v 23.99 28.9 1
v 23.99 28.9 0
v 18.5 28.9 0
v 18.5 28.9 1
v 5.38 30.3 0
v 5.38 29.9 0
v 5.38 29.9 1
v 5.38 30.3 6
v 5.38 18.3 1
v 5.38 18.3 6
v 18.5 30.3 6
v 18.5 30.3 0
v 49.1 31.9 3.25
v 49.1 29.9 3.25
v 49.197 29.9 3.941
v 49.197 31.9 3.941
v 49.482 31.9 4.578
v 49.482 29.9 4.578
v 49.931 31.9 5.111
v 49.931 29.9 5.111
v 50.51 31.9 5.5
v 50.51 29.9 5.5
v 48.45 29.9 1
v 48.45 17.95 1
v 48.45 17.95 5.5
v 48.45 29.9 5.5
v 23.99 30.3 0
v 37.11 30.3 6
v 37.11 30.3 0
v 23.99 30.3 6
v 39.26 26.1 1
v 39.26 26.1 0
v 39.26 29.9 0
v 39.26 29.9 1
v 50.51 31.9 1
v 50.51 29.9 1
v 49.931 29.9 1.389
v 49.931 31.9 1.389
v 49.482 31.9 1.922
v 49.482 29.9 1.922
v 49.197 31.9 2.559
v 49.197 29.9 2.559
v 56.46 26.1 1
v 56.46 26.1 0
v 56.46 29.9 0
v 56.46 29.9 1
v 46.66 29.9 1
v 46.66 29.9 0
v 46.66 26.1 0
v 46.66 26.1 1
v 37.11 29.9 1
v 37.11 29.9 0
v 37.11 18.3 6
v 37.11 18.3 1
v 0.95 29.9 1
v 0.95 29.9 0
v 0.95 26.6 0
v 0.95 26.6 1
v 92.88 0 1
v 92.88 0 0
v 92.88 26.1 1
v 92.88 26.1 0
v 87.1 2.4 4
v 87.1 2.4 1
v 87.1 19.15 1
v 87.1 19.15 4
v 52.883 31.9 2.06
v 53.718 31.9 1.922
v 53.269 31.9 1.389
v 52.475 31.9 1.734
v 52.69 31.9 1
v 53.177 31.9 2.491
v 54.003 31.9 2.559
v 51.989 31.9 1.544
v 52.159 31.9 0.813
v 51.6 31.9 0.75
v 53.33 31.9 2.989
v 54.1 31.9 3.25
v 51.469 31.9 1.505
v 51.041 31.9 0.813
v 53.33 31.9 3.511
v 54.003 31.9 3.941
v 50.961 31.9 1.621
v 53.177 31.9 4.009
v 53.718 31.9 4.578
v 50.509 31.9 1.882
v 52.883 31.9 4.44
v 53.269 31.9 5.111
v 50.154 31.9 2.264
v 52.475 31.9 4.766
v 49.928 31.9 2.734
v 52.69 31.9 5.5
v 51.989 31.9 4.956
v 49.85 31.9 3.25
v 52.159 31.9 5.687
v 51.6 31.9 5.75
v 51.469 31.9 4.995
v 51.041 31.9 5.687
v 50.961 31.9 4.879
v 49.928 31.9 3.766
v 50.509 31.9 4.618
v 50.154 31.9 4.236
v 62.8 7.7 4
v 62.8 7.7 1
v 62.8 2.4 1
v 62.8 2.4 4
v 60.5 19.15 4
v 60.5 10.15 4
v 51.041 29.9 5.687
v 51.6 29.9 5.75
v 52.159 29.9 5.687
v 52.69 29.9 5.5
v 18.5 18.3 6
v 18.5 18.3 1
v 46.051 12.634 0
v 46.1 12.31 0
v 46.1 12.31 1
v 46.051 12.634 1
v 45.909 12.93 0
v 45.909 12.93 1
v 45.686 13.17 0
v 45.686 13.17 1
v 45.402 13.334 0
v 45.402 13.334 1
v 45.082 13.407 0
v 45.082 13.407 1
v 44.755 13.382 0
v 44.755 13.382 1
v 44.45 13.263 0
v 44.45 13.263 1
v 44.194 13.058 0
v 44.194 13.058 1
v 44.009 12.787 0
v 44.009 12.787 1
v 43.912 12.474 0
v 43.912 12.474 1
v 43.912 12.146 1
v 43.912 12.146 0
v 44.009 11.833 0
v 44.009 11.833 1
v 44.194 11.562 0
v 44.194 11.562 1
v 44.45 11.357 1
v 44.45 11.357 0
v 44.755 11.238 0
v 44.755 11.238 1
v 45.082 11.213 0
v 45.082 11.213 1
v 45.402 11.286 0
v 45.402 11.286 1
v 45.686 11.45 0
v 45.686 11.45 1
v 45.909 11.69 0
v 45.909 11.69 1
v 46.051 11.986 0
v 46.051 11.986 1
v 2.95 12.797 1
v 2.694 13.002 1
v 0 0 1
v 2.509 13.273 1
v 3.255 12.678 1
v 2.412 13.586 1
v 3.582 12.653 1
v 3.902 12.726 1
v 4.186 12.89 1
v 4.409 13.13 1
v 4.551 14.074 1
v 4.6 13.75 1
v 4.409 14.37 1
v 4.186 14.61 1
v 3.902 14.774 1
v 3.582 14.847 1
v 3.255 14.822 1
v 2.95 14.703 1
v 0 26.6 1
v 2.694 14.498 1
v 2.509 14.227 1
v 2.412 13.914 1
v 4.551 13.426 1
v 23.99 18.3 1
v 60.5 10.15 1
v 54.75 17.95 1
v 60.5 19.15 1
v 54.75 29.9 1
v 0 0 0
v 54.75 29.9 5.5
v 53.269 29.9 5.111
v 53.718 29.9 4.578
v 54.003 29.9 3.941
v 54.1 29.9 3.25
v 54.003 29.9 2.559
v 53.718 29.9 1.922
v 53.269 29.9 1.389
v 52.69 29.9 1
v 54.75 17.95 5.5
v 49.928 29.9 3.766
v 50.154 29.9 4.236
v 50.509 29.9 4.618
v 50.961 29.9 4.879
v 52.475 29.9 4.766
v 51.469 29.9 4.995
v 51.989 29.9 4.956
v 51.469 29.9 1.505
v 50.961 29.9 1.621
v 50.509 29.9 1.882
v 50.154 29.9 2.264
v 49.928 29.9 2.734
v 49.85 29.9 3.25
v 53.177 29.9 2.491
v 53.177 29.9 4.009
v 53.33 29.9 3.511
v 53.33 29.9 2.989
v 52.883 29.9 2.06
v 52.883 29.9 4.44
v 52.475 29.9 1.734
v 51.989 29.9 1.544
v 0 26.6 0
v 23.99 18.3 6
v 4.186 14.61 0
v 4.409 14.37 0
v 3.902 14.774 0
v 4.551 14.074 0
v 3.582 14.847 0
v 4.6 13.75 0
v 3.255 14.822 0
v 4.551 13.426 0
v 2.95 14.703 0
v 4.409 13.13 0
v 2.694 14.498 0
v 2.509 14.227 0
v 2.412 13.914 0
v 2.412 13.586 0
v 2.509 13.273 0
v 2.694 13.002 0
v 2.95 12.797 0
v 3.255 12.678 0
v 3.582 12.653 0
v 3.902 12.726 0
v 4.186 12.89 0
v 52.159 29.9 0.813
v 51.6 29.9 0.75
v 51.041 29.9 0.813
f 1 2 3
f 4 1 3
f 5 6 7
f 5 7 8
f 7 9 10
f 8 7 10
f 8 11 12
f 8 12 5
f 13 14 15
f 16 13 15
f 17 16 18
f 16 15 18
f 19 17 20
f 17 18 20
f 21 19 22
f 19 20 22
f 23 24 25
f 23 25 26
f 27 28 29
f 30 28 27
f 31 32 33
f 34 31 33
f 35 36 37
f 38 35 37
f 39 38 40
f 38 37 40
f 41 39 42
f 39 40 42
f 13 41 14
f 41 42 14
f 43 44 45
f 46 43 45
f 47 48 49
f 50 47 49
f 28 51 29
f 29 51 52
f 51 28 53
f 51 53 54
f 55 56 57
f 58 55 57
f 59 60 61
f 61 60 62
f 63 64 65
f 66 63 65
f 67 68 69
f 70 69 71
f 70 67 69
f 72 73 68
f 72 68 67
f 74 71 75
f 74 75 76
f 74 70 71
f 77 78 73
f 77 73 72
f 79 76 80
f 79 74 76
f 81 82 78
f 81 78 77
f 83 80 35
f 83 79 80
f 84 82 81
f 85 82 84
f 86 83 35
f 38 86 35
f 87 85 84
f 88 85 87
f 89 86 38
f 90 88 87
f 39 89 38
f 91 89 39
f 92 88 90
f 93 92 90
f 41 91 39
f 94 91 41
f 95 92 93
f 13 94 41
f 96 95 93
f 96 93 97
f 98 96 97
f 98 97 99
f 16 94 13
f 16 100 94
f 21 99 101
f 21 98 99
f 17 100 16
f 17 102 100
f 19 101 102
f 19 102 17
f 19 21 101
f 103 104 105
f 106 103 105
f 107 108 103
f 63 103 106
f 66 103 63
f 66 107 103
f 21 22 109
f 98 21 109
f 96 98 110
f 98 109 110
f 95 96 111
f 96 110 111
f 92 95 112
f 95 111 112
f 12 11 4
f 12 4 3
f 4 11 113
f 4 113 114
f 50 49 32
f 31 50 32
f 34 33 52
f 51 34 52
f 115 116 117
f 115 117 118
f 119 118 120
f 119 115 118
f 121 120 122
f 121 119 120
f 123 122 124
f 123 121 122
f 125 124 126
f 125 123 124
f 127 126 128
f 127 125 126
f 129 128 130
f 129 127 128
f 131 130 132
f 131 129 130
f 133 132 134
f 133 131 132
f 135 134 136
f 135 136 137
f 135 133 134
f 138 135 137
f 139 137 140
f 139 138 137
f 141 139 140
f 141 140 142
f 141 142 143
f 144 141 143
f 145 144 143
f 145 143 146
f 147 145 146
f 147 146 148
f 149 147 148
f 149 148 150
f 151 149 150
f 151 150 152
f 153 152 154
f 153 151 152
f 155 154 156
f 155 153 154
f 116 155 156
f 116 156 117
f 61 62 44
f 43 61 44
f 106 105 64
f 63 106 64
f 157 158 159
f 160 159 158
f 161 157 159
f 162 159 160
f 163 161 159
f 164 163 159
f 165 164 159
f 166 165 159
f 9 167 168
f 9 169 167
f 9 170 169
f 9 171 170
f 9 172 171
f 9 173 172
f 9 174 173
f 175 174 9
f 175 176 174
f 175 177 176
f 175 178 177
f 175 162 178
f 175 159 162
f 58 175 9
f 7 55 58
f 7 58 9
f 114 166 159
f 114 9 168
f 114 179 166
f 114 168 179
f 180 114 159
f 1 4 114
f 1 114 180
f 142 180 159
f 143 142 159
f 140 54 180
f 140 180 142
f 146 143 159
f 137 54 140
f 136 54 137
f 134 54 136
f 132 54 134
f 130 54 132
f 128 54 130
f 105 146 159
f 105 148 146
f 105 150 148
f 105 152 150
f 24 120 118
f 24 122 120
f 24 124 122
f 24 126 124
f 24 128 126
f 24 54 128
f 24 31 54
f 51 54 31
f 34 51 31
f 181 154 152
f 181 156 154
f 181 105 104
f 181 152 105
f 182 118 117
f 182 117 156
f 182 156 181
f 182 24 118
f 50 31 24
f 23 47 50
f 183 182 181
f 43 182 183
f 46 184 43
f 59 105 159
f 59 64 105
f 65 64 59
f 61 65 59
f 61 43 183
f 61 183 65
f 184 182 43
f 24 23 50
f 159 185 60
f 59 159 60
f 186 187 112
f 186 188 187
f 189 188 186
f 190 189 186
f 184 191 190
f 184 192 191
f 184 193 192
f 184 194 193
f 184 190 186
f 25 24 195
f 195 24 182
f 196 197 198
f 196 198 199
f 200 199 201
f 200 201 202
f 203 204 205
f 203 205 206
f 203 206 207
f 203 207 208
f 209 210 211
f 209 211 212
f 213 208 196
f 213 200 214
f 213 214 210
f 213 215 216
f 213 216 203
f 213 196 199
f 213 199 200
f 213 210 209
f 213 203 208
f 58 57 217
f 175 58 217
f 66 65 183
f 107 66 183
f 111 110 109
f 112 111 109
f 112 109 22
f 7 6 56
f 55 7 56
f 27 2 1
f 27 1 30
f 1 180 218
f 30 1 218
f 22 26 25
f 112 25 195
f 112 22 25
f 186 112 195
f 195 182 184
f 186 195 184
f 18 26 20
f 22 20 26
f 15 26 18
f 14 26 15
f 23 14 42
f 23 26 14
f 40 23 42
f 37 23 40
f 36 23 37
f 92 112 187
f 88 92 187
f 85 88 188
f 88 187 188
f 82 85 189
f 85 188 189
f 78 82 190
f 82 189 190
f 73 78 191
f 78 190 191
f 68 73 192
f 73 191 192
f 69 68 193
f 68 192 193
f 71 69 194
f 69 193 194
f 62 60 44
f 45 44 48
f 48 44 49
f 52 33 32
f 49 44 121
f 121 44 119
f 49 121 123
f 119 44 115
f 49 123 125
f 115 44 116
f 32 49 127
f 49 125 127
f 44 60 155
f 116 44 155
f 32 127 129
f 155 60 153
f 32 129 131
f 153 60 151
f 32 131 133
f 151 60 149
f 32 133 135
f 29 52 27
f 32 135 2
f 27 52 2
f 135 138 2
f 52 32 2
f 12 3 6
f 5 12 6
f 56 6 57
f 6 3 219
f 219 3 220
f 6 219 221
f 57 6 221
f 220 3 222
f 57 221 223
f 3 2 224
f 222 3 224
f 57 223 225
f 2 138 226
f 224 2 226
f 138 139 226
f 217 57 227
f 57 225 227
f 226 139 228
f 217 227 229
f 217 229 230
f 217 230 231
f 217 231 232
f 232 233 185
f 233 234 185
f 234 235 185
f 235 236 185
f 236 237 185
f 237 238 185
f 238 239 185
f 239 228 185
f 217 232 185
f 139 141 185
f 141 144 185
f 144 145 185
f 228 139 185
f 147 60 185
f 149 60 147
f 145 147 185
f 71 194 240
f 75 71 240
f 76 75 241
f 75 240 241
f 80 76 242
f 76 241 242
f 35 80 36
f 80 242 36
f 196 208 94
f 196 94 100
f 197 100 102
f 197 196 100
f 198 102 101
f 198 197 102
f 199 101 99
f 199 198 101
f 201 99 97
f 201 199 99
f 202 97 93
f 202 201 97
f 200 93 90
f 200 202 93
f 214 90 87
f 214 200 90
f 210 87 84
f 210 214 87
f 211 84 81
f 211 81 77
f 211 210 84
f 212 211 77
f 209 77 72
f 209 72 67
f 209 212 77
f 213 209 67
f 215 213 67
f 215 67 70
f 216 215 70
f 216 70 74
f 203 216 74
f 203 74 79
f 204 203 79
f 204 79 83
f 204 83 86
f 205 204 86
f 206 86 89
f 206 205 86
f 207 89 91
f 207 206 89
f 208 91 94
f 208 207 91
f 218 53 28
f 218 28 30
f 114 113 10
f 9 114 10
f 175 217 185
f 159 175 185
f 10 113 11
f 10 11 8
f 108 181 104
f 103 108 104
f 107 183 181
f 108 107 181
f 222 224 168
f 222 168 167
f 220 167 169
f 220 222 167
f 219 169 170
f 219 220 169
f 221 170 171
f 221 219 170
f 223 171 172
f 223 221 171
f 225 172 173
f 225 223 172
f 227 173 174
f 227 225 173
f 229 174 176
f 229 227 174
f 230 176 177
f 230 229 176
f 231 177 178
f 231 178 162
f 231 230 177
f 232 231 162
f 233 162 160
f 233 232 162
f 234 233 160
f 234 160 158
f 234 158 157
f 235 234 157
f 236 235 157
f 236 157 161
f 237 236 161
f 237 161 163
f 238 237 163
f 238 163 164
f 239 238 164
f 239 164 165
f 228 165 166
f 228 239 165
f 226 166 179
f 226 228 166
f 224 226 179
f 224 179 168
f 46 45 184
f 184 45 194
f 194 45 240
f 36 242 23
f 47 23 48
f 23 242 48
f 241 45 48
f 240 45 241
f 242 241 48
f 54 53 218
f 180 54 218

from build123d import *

# Parameters (mm, degrees)
F0_R      = 1.1
F1_DEPTH  = 1
F2_W      = 6.3
F2_H      = 11.95
F3_DEPTH  = 4.5
F4_DEPTH  = 3
F5_R      = 1.75
F6_DEPTH  = 2
F7_W      = 13.12
F7_H      = 5
F7_H_2    = 1
F8_DEPTH  = 12
F9_W      = 13.12
F9_H      = 5
F9_H_2    = 1
F10_DEPTH = 12


with BuildPart() as f1:
    # F0 (on Top) → F1 (new body)
    with BuildSketch(Plane.XY):
        Polygon((92.88, 0), (92.88, 26.1), (56.46, 26.1), (56.46, 29.9), (46.66, 29.9), (46.66, 26.1), (39.26, 26.1), (39.26, 29.9), (37.11, 29.9), (37.11, 18.3), (23.99, 18.3), (23.99, 28.9), (18.5, 28.9), (18.5, 18.3), (5.38, 18.3), (5.38, 29.9), (0.95, 29.9), (0.95, 26.6), (0, 26.6), (0, 0), align=None)
        with Locations((3.5, 13.75)):
            Circle(F0_R, mode=Mode.SUBTRACT)
        with Locations((45, 12.31)):
            Circle(F0_R, mode=Mode.SUBTRACT)
    extrude(amount=F1_DEPTH)

    # F2 (on face) → F3 (join)
    with BuildSketch(Plane.XY.offset(1)):
        with Locations((51.6, 23.925000114)):
            Rectangle(F2_W, F2_H)
    extrude(amount=F3_DEPTH)

    # F2 (on face) → F4 (join)
    with BuildSketch(Plane.XY.offset(1)):
        Polygon((87.1, 2.400000114), (87.1, 19.150000114), (60.5, 19.150000114), (60.5, 10.150000114), (62.8, 7.700000114), (62.8, 2.400000114), align=None)
    extrude(amount=F4_DEPTH)

    # F5 (on face) → F6 (join)
    with BuildSketch(Plane(origin=(0, 29.9, 0), x_dir=(-1, 0, 0), z_dir=(0, 1, 0))):
        with BuildLine():
            ThreePointArc((-50.5102752641, 1), (-49.4817091985, 1.9222786135), (-49.1, 3.25))
            ThreePointArc((-49.1, 3.25), (-49.4817091985, 4.5777213865), (-50.5102752641, 5.5))
            Line((-50.5102752641, 5.5), (-52.6897247359, 5.5))
            ThreePointArc((-52.6897247359, 5.5), (-54.1, 3.25), (-52.6897247359, 1))
            Line((-52.6897247359, 1), (-50.5102752641, 1))
        make_face()
        with Locations((-51.6, 3.25)):
            Circle(F5_R, mode=Mode.SUBTRACT)
        with BuildLine():
            Line((-52.6897247359, 5.5), (-50.5102752641, 5.5))
            ThreePointArc((-50.5102752641, 5.5), (-51.6, 5.75), (-52.6897247359, 5.5))
        make_face()
        with BuildLine():
            ThreePointArc((-52.6897247359, 1), (-51.6, 0.75), (-50.5102752641, 1))
            Line((-50.5102752641, 1), (-52.6897247359, 1))
        make_face()
    extrude(amount=F6_DEPTH)

    # F7 (on face) → F8 (join)
    with BuildSketch(Plane(origin=(0, 18.3, 0), x_dir=(-1, 0, 0), z_dir=(0, 1, 0))):
        with Locations((-11.94, 3.5)):
            Rectangle(F7_W, F7_H)
        with Locations((-11.94, 0.5)):
            Rectangle(F7_W, F7_H_2)
    extrude(amount=F8_DEPTH)

    # F9 (on face) → F10 (join)
    with BuildSketch(Plane(origin=(0, 18.3, 0), x_dir=(-1, 0, 0), z_dir=(0, 1, 0))):
        with Locations((-30.55, 3.5)):
            Rectangle(F9_W, F9_H)
        with Locations((-30.55, 0.5)):
            Rectangle(F9_W, F9_H_2)
    extrude(amount=F10_DEPTH)


solid = f1.part
